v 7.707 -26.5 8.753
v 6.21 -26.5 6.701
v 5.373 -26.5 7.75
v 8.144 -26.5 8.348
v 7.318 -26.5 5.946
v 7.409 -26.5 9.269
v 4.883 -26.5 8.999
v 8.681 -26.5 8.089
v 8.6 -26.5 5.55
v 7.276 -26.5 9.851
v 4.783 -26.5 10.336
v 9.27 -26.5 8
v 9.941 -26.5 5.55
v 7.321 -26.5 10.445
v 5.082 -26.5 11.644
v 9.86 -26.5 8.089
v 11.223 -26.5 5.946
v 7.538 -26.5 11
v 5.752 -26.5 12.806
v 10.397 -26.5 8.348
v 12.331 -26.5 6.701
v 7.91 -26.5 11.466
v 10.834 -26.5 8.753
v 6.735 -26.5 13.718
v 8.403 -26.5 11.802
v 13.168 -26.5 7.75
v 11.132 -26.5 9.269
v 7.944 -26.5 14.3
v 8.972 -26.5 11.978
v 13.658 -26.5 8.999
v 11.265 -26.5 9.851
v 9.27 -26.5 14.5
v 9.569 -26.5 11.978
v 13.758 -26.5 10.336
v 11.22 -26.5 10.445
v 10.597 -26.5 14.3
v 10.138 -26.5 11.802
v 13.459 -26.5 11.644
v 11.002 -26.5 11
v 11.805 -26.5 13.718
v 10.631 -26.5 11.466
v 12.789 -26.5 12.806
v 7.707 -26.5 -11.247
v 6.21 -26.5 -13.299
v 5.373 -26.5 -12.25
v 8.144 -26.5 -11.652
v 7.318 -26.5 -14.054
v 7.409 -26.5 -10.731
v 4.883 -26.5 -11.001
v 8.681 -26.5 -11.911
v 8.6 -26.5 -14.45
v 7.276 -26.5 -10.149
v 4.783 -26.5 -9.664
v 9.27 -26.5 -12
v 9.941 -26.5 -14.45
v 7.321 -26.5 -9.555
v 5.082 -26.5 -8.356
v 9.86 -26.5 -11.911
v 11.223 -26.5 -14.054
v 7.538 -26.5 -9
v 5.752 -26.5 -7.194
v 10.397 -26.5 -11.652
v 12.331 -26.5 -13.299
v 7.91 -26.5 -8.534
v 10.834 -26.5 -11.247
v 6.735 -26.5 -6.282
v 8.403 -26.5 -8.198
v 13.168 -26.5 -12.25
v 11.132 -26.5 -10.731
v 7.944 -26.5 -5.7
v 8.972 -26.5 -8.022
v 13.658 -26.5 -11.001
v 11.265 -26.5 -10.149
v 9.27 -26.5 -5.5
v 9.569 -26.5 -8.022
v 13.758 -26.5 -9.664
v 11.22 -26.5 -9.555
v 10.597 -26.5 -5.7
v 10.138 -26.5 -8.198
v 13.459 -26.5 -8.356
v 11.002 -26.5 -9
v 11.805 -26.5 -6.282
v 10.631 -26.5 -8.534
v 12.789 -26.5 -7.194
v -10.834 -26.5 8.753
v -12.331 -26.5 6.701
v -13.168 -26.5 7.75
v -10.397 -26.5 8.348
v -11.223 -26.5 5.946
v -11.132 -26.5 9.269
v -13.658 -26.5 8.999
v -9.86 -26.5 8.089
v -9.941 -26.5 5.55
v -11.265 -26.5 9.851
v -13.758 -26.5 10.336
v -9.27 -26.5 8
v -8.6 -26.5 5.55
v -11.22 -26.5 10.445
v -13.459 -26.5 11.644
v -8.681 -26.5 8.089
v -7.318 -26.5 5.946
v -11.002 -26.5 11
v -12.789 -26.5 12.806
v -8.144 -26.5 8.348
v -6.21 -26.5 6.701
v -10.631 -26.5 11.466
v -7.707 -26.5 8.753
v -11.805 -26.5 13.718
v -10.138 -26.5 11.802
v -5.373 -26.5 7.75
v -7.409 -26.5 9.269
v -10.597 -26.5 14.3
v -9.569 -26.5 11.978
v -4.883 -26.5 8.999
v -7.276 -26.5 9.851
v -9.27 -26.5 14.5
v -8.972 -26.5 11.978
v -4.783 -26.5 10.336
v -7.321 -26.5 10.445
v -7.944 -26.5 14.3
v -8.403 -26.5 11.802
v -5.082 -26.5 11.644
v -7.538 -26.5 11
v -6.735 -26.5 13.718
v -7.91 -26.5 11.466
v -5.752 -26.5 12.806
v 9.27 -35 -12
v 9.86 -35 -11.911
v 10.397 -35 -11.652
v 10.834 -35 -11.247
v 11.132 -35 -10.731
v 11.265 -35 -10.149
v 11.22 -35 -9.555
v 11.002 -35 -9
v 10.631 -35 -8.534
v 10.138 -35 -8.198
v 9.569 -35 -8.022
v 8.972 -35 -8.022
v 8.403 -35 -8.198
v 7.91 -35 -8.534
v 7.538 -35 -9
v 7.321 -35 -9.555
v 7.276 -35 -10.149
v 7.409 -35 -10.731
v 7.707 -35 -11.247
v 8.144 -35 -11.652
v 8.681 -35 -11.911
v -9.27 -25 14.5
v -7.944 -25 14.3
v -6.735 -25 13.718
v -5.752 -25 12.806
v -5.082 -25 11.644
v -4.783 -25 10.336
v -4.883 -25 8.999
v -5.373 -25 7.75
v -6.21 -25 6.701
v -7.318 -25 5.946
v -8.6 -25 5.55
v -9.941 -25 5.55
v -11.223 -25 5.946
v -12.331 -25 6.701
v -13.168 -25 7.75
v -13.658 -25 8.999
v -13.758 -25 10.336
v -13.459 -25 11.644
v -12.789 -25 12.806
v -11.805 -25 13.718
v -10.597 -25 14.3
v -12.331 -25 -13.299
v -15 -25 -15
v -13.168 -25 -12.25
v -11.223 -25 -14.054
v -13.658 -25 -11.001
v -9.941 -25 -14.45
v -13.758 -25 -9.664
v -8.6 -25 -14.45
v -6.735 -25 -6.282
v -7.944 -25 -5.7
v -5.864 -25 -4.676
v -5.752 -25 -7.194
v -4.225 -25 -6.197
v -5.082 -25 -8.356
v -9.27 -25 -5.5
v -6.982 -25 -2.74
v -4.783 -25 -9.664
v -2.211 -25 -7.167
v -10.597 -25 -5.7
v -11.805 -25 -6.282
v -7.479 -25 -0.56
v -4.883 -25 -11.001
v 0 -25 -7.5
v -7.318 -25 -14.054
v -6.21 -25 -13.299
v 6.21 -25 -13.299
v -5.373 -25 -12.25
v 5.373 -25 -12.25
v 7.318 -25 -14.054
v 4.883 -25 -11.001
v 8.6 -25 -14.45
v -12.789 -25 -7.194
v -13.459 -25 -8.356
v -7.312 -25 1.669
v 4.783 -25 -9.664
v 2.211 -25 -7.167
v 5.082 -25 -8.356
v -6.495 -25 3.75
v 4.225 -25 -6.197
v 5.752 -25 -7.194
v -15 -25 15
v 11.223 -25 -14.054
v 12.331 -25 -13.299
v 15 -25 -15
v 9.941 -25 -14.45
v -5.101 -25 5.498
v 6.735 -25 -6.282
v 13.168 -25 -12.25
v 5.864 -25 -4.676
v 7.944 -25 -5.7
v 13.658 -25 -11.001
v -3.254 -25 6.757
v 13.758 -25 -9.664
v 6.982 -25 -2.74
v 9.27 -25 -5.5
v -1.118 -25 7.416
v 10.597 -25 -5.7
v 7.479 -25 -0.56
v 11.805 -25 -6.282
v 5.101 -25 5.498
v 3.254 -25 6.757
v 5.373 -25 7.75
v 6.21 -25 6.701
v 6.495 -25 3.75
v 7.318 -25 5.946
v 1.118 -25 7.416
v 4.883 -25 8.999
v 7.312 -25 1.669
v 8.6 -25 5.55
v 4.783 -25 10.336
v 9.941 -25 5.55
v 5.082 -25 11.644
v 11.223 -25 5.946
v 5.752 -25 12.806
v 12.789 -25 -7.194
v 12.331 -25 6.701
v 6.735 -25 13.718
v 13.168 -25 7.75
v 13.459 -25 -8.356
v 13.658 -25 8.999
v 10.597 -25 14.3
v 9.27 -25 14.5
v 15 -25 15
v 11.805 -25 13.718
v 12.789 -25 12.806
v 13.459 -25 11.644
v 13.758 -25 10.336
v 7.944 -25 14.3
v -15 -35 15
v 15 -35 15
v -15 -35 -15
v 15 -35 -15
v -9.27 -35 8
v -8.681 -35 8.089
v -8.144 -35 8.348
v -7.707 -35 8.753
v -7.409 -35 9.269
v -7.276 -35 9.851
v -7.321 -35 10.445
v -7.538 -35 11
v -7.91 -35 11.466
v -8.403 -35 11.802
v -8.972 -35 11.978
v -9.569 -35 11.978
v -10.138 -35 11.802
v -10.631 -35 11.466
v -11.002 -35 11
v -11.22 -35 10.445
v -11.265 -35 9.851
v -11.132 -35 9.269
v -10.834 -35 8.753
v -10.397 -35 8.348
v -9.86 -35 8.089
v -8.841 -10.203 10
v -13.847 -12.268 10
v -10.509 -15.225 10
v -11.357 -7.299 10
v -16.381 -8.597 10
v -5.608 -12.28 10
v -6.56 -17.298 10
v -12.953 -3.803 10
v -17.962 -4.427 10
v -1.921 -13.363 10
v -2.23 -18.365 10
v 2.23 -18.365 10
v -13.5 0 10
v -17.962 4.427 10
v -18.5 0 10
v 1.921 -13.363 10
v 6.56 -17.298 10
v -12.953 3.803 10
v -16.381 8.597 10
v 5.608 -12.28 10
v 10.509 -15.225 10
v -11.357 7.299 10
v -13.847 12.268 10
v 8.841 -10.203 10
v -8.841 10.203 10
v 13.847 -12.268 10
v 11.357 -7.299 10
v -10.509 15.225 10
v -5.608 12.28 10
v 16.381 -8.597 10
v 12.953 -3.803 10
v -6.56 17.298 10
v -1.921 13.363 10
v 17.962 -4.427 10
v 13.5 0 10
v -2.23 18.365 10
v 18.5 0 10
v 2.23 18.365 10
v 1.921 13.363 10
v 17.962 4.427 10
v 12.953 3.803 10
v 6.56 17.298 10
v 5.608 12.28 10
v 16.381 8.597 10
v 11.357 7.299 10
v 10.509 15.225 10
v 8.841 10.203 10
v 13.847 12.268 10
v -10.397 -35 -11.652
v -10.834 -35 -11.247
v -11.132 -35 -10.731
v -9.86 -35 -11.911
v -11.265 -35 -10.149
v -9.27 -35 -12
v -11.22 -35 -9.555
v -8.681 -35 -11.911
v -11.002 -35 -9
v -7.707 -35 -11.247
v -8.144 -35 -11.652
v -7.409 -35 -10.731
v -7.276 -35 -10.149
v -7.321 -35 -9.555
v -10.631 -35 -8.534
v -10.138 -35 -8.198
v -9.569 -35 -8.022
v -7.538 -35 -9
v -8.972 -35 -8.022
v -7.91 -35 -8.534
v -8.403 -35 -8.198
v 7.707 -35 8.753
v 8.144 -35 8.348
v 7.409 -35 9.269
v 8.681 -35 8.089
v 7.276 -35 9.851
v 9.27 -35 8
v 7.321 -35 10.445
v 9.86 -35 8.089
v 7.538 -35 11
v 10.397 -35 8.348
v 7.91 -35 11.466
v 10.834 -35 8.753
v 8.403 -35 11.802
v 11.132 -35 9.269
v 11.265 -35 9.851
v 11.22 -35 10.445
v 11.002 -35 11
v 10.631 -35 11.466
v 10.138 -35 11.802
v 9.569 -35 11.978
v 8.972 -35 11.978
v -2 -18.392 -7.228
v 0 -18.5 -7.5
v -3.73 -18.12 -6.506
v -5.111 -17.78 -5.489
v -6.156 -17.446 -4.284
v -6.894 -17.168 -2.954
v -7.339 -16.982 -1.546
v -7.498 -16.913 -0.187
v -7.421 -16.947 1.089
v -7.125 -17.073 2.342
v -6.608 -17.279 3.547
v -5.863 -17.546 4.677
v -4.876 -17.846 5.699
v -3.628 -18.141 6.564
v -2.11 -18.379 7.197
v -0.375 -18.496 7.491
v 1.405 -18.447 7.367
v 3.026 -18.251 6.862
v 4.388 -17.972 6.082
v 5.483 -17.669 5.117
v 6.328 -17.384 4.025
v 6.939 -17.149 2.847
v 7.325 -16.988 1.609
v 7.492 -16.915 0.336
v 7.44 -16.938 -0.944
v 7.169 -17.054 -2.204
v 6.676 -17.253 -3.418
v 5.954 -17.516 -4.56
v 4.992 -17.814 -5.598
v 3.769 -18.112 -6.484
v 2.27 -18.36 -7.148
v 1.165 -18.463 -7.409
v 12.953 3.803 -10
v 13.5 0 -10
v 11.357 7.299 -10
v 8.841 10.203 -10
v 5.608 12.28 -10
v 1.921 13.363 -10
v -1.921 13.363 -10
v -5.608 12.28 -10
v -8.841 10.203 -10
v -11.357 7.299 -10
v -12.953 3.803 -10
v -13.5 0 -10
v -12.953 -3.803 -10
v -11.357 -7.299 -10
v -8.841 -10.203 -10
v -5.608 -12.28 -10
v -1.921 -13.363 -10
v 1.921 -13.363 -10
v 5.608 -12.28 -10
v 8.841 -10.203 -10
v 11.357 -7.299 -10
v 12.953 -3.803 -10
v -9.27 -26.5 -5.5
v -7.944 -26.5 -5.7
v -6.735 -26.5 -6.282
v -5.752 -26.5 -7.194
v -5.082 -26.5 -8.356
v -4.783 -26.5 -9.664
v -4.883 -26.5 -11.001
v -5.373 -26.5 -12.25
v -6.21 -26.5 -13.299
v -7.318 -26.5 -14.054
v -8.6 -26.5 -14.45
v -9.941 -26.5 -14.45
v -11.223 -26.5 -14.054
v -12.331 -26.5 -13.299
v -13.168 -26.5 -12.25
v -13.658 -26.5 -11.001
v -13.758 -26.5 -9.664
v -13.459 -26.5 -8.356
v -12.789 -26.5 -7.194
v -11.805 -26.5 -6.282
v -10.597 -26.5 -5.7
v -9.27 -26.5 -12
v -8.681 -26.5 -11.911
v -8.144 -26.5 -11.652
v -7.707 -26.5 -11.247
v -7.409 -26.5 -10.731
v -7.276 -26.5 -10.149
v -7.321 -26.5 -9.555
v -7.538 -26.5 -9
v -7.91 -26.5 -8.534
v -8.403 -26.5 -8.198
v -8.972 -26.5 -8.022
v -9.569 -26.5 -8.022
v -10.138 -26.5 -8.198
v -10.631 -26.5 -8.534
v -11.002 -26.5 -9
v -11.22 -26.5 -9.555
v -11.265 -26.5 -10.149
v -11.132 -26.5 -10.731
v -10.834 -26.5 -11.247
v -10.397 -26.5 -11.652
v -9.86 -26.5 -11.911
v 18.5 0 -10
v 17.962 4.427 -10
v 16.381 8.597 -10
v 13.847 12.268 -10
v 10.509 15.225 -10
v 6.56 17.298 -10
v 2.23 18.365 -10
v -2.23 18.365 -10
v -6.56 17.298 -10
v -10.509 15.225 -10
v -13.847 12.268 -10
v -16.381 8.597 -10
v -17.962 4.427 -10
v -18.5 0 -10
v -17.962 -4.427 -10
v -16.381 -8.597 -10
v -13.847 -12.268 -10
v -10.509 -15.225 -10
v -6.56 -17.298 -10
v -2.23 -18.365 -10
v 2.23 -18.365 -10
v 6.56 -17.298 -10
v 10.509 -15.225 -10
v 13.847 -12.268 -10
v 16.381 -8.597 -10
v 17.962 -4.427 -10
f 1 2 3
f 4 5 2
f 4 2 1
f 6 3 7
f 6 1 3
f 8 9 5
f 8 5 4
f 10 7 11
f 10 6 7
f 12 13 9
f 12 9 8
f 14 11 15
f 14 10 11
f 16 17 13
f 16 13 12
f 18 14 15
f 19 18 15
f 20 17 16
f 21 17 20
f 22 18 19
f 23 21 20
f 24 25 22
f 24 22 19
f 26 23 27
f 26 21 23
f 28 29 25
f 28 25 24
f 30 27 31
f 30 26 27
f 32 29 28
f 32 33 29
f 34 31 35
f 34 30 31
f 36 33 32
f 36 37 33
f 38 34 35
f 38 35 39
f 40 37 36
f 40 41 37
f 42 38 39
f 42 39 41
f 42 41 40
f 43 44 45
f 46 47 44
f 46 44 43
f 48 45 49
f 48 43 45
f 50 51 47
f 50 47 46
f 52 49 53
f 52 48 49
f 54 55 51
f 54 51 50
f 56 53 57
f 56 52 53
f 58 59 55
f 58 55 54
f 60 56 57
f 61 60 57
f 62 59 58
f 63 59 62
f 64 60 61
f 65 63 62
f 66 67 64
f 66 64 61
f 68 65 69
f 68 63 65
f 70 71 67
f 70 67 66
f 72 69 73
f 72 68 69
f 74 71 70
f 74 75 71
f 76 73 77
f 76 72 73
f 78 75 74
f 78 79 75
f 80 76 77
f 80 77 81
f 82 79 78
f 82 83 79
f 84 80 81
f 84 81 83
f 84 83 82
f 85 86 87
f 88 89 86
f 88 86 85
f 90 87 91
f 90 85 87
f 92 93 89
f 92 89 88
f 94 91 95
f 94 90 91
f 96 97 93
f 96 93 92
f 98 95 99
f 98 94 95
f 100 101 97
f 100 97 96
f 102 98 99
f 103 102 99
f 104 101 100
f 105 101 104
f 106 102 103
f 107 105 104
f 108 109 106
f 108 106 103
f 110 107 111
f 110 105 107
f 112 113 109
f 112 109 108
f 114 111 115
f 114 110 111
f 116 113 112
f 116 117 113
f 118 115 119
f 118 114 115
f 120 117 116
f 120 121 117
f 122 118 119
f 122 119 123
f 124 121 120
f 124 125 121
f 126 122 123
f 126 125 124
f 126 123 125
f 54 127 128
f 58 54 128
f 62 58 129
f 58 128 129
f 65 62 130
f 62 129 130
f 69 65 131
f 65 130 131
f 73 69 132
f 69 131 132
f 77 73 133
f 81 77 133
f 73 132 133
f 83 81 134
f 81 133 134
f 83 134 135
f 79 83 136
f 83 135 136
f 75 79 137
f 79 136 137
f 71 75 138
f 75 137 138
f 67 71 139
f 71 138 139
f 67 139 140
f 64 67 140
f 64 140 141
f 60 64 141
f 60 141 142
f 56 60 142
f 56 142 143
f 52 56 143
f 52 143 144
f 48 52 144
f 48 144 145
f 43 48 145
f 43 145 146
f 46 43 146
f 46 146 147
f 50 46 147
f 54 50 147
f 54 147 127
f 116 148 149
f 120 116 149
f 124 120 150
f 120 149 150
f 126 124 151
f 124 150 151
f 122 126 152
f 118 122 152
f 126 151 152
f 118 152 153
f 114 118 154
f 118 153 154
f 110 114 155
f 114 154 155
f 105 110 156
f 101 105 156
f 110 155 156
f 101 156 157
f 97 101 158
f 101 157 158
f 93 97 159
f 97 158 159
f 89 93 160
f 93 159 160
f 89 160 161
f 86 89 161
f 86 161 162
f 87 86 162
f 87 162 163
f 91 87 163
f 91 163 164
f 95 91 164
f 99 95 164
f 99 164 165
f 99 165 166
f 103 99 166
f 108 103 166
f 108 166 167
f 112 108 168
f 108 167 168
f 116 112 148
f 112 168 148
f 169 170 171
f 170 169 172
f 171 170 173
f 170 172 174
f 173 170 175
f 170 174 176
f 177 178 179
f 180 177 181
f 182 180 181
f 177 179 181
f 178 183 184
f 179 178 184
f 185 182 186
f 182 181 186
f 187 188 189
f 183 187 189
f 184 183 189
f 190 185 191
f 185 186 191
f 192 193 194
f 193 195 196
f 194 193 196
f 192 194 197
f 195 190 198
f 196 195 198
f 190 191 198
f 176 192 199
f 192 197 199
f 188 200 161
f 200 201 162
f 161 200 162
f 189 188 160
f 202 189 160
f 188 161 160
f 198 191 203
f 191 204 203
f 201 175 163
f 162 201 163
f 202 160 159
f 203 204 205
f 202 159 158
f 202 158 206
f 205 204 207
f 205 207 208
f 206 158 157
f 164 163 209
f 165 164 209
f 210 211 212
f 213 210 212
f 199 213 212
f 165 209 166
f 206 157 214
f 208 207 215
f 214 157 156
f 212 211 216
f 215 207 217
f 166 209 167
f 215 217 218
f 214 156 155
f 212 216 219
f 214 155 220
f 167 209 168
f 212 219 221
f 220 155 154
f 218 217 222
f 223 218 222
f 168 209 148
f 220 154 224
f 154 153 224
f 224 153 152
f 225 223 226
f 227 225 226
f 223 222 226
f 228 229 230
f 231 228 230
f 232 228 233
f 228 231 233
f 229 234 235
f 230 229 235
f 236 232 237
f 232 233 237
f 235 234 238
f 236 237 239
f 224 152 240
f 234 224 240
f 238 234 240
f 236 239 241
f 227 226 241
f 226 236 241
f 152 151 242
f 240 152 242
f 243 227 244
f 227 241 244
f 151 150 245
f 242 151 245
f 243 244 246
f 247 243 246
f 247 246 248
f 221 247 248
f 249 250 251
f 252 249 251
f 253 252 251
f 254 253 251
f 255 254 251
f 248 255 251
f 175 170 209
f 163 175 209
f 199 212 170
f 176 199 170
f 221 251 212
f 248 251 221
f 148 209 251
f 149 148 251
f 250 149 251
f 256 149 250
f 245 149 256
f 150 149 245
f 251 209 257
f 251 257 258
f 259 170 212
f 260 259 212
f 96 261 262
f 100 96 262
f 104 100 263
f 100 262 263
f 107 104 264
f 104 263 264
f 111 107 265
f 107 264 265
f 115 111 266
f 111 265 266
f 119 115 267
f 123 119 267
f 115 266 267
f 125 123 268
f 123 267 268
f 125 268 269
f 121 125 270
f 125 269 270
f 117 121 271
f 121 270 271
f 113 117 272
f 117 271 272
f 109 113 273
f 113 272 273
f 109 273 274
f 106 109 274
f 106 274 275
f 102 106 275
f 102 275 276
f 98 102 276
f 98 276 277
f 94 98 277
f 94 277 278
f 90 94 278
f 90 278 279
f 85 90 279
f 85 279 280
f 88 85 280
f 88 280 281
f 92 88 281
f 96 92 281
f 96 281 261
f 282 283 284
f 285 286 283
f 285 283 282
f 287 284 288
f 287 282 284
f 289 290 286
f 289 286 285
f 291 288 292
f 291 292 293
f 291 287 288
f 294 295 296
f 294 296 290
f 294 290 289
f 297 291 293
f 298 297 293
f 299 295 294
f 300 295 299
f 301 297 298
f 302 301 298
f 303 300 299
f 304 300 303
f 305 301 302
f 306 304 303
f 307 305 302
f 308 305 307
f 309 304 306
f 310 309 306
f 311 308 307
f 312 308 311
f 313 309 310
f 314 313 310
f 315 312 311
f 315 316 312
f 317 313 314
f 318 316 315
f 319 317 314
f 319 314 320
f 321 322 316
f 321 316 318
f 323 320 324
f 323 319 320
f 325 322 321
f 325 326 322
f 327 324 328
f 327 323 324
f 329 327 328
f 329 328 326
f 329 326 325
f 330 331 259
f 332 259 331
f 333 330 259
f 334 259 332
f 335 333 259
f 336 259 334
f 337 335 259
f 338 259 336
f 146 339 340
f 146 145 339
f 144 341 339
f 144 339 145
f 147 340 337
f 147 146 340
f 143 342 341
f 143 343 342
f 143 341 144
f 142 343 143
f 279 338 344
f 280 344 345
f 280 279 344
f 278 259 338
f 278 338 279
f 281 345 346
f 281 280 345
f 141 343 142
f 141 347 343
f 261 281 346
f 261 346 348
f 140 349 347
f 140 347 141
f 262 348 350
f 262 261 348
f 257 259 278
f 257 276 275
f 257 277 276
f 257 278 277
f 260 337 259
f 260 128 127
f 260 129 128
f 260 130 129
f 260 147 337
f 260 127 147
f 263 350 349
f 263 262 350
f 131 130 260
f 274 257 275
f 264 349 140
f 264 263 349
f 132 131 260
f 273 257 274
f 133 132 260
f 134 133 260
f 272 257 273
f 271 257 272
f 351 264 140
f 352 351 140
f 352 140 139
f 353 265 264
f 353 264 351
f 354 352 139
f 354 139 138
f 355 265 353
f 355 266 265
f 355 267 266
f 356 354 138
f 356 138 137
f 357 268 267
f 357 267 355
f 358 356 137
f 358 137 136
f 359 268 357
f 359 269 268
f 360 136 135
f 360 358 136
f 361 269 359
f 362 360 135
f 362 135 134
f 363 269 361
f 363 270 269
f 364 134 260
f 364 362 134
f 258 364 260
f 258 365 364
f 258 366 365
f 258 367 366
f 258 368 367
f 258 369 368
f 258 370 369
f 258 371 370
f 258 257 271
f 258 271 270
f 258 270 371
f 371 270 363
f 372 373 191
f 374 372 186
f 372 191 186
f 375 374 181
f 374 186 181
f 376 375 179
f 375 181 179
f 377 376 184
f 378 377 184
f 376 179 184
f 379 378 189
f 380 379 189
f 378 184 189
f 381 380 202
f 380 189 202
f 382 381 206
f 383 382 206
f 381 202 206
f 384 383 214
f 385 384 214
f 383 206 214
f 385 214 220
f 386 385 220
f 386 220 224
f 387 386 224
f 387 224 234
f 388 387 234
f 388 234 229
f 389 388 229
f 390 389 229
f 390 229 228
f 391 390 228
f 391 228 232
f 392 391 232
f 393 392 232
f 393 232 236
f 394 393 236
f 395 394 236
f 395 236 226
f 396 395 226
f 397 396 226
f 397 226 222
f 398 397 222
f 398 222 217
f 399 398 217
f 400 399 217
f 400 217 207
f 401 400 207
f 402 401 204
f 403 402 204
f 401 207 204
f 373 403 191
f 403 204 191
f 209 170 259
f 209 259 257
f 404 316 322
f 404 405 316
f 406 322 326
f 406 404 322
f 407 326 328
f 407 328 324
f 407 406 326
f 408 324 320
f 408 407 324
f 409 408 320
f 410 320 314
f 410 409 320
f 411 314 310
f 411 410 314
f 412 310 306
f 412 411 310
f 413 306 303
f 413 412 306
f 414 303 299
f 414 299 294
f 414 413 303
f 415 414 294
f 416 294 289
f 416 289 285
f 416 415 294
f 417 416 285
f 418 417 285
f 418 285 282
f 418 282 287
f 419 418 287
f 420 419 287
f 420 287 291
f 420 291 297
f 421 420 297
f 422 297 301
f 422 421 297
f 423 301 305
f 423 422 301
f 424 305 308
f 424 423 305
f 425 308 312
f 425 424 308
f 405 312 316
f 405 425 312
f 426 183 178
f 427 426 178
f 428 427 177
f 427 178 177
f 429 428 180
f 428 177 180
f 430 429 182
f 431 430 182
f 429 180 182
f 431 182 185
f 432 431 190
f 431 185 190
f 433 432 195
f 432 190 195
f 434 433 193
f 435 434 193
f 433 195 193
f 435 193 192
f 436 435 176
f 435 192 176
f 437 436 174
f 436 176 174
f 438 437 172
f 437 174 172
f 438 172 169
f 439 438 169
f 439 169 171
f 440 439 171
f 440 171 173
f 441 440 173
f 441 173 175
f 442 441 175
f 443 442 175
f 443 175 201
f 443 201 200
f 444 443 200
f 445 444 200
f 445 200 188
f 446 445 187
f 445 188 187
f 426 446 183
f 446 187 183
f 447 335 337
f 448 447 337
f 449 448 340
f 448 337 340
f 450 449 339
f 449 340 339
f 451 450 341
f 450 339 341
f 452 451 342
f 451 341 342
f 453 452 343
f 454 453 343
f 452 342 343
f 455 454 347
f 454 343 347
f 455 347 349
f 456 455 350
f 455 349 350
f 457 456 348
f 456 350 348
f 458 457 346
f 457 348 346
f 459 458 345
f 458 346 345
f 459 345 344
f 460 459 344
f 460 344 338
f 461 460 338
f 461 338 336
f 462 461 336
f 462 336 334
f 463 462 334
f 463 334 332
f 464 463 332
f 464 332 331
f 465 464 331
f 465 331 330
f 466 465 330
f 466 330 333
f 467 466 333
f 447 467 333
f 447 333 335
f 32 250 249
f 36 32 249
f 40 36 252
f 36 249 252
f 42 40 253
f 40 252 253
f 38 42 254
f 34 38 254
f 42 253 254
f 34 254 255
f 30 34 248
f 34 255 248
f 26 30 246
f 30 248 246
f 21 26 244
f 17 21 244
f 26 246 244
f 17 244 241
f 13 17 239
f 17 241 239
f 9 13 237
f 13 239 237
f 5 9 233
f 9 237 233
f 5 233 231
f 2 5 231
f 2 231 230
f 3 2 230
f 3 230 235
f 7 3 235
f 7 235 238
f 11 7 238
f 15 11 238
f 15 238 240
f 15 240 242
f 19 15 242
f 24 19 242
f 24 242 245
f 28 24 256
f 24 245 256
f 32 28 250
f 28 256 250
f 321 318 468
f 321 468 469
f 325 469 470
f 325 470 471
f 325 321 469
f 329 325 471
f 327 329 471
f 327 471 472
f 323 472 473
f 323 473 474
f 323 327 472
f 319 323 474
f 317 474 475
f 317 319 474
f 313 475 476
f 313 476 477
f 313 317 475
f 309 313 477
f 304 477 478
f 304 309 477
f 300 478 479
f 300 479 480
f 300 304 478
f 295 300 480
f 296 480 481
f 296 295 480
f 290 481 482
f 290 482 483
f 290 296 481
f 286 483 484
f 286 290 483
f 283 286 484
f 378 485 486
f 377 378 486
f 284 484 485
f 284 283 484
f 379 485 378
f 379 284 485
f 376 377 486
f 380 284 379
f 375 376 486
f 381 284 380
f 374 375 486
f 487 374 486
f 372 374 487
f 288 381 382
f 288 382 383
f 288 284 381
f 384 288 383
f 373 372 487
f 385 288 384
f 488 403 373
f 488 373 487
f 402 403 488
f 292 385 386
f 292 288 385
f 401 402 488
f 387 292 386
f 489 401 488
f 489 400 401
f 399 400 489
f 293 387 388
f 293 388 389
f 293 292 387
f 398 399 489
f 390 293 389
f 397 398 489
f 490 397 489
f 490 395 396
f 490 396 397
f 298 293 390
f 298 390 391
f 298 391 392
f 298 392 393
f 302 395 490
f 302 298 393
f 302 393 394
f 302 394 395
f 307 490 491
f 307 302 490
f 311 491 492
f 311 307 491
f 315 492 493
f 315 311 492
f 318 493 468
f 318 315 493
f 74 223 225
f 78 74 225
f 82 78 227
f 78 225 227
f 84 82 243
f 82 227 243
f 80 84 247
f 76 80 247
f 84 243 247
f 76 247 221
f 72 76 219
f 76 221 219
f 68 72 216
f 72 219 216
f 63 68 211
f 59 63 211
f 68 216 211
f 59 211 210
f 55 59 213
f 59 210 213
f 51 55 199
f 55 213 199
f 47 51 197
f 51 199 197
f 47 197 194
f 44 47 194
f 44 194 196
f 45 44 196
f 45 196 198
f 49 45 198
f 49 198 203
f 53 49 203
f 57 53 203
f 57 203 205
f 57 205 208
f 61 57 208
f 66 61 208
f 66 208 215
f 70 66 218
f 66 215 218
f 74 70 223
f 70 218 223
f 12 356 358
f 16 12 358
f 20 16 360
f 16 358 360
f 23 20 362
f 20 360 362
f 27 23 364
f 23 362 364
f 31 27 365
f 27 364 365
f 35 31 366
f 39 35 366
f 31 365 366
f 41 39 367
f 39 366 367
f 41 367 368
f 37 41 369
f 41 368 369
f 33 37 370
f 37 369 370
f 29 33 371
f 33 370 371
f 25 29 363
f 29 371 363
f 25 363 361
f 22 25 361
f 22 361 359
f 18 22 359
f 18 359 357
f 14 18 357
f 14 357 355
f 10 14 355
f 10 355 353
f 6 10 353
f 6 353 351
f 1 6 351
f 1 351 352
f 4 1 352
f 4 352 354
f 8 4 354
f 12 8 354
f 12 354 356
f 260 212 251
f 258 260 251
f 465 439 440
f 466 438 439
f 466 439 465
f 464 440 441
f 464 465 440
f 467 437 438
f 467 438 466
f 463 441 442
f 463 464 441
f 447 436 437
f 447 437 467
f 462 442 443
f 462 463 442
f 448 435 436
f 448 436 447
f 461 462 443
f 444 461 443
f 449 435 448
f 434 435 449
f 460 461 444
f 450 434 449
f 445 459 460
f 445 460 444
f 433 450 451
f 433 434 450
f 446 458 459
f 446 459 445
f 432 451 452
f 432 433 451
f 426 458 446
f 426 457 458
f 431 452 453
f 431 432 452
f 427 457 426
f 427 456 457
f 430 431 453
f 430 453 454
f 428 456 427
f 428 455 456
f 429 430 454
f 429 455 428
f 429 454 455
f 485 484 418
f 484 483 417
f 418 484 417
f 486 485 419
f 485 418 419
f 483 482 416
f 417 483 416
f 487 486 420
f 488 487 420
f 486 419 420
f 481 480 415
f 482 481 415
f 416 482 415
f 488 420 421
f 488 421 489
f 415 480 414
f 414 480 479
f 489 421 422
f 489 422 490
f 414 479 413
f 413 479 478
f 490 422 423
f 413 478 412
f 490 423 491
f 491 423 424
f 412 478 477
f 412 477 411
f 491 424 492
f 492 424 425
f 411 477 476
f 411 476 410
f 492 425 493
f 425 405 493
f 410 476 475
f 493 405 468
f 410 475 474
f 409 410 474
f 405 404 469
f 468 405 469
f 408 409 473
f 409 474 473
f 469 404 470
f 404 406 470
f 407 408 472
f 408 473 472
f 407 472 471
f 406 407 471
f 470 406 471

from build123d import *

# Parameters (mm, degrees)
SKETCH_1_R           = 18.5
SKETCH_1_R_2         = 13.5
EXTRUDE_1_DEPTH      = 10
EXTRUDE_2_REACH      = 50.317
EXTRUDE_2_END_RADIUS = 18.5
SKETCH_2_R           = 7.5
SKETCH_3_W           = 30
SKETCH_3_H           = 30
EXTRUDE_3_DEPTH      = 10
SKETCH_4_R           = 2
CUT_EXTRUDE_1_DEPTH  = 15
SKETCH_5_R           = 4.5
CUT_EXTRUDE_2_DEPTH  = 1.5


with BuildPart() as part:
    # 草图1 → 凸台-拉伸1 (new, symmetric)
    with BuildSketch(Plane.XY):
        Circle(SKETCH_1_R)
        Circle(SKETCH_1_R_2, mode=Mode.SUBTRACT)
    extrude(amount=EXTRUDE_1_DEPTH, both=True)

    # 凸台-拉伸2: up to this cylinder (the profile starts outside it)
    extrude_2_end = Plane(origin=(0, 0, 0), z_dir=(0, 0, -1)) * Cylinder(EXTRUDE_2_END_RADIUS, 138.634, mode=Mode.PRIVATE)
    # 草图2 → 凸台-拉伸2 (add, up to the surface)
    with BuildSketch(Plane(origin=(0, -25, 0), x_dir=(1, 0, 0), z_dir=(0, 1, 0)), mode=Mode.PRIVATE) as extrude_2_sk1:
        with Locations(Location((0, 0, 0), (0, 0, 90))):
            Circle(SKETCH_2_R)
    extrude_2_tool1 = extrude(extrude_2_sk1.sketch, amount=EXTRUDE_2_REACH, mode=Mode.PRIVATE) - extrude_2_end
    add(extrude_2_tool1.solids().sort_by_distance((0, -25, 0))[0])

    # 草图3 → 凸台-拉伸3 (add)
    with BuildSketch(Plane.XZ.offset(25)):
        Rectangle(SKETCH_3_W, SKETCH_3_H)
    extrude(amount=EXTRUDE_3_DEPTH)

    # 草图4 → 切除-拉伸1 (cut)
    with BuildSketch(Plane.XZ.offset(35)):
        with Locations(Location((-9.270440252, 10, 0), (0, 0, 270))):
            Circle(SKETCH_4_R)
        with Locations(Location((9.270440252, 10, 0), (0, 0, 270))):
            Circle(SKETCH_4_R)
        with Locations(Location((-9.270440252, -10, 0), (0, 0, 270))):
            Circle(SKETCH_4_R)
        with Locations(Location((9.270440252, -10, 0), (0, 0, 270))):
            Circle(SKETCH_4_R)
    extrude(amount=-CUT_EXTRUDE_1_DEPTH, mode=Mode.SUBTRACT)

    # 草图5 → 切除-拉伸2 (cut)
    with BuildSketch(Plane(origin=(0, -25, 0), x_dir=(1, 0, 0), z_dir=(0, 1, 0))):
        with Locations(Location((-9.270440252, -10, 0), (0, 0, 270))):
            Circle(SKETCH_5_R)
        with Locations(Location((9.270440252, -10, 0), (0, 0, 270))):
            Circle(SKETCH_5_R)
        with Locations(Location((9.270440252, 10, 0), (0, 0, 270))):
            Circle(SKETCH_5_R)
        with Locations(Location((-9.270440252, 10, 0), (0, 0, 270))):
            Circle(SKETCH_5_R)
    extrude(amount=-CUT_EXTRUDE_2_DEPTH, mode=Mode.SUBTRACT)


solid = part.part
